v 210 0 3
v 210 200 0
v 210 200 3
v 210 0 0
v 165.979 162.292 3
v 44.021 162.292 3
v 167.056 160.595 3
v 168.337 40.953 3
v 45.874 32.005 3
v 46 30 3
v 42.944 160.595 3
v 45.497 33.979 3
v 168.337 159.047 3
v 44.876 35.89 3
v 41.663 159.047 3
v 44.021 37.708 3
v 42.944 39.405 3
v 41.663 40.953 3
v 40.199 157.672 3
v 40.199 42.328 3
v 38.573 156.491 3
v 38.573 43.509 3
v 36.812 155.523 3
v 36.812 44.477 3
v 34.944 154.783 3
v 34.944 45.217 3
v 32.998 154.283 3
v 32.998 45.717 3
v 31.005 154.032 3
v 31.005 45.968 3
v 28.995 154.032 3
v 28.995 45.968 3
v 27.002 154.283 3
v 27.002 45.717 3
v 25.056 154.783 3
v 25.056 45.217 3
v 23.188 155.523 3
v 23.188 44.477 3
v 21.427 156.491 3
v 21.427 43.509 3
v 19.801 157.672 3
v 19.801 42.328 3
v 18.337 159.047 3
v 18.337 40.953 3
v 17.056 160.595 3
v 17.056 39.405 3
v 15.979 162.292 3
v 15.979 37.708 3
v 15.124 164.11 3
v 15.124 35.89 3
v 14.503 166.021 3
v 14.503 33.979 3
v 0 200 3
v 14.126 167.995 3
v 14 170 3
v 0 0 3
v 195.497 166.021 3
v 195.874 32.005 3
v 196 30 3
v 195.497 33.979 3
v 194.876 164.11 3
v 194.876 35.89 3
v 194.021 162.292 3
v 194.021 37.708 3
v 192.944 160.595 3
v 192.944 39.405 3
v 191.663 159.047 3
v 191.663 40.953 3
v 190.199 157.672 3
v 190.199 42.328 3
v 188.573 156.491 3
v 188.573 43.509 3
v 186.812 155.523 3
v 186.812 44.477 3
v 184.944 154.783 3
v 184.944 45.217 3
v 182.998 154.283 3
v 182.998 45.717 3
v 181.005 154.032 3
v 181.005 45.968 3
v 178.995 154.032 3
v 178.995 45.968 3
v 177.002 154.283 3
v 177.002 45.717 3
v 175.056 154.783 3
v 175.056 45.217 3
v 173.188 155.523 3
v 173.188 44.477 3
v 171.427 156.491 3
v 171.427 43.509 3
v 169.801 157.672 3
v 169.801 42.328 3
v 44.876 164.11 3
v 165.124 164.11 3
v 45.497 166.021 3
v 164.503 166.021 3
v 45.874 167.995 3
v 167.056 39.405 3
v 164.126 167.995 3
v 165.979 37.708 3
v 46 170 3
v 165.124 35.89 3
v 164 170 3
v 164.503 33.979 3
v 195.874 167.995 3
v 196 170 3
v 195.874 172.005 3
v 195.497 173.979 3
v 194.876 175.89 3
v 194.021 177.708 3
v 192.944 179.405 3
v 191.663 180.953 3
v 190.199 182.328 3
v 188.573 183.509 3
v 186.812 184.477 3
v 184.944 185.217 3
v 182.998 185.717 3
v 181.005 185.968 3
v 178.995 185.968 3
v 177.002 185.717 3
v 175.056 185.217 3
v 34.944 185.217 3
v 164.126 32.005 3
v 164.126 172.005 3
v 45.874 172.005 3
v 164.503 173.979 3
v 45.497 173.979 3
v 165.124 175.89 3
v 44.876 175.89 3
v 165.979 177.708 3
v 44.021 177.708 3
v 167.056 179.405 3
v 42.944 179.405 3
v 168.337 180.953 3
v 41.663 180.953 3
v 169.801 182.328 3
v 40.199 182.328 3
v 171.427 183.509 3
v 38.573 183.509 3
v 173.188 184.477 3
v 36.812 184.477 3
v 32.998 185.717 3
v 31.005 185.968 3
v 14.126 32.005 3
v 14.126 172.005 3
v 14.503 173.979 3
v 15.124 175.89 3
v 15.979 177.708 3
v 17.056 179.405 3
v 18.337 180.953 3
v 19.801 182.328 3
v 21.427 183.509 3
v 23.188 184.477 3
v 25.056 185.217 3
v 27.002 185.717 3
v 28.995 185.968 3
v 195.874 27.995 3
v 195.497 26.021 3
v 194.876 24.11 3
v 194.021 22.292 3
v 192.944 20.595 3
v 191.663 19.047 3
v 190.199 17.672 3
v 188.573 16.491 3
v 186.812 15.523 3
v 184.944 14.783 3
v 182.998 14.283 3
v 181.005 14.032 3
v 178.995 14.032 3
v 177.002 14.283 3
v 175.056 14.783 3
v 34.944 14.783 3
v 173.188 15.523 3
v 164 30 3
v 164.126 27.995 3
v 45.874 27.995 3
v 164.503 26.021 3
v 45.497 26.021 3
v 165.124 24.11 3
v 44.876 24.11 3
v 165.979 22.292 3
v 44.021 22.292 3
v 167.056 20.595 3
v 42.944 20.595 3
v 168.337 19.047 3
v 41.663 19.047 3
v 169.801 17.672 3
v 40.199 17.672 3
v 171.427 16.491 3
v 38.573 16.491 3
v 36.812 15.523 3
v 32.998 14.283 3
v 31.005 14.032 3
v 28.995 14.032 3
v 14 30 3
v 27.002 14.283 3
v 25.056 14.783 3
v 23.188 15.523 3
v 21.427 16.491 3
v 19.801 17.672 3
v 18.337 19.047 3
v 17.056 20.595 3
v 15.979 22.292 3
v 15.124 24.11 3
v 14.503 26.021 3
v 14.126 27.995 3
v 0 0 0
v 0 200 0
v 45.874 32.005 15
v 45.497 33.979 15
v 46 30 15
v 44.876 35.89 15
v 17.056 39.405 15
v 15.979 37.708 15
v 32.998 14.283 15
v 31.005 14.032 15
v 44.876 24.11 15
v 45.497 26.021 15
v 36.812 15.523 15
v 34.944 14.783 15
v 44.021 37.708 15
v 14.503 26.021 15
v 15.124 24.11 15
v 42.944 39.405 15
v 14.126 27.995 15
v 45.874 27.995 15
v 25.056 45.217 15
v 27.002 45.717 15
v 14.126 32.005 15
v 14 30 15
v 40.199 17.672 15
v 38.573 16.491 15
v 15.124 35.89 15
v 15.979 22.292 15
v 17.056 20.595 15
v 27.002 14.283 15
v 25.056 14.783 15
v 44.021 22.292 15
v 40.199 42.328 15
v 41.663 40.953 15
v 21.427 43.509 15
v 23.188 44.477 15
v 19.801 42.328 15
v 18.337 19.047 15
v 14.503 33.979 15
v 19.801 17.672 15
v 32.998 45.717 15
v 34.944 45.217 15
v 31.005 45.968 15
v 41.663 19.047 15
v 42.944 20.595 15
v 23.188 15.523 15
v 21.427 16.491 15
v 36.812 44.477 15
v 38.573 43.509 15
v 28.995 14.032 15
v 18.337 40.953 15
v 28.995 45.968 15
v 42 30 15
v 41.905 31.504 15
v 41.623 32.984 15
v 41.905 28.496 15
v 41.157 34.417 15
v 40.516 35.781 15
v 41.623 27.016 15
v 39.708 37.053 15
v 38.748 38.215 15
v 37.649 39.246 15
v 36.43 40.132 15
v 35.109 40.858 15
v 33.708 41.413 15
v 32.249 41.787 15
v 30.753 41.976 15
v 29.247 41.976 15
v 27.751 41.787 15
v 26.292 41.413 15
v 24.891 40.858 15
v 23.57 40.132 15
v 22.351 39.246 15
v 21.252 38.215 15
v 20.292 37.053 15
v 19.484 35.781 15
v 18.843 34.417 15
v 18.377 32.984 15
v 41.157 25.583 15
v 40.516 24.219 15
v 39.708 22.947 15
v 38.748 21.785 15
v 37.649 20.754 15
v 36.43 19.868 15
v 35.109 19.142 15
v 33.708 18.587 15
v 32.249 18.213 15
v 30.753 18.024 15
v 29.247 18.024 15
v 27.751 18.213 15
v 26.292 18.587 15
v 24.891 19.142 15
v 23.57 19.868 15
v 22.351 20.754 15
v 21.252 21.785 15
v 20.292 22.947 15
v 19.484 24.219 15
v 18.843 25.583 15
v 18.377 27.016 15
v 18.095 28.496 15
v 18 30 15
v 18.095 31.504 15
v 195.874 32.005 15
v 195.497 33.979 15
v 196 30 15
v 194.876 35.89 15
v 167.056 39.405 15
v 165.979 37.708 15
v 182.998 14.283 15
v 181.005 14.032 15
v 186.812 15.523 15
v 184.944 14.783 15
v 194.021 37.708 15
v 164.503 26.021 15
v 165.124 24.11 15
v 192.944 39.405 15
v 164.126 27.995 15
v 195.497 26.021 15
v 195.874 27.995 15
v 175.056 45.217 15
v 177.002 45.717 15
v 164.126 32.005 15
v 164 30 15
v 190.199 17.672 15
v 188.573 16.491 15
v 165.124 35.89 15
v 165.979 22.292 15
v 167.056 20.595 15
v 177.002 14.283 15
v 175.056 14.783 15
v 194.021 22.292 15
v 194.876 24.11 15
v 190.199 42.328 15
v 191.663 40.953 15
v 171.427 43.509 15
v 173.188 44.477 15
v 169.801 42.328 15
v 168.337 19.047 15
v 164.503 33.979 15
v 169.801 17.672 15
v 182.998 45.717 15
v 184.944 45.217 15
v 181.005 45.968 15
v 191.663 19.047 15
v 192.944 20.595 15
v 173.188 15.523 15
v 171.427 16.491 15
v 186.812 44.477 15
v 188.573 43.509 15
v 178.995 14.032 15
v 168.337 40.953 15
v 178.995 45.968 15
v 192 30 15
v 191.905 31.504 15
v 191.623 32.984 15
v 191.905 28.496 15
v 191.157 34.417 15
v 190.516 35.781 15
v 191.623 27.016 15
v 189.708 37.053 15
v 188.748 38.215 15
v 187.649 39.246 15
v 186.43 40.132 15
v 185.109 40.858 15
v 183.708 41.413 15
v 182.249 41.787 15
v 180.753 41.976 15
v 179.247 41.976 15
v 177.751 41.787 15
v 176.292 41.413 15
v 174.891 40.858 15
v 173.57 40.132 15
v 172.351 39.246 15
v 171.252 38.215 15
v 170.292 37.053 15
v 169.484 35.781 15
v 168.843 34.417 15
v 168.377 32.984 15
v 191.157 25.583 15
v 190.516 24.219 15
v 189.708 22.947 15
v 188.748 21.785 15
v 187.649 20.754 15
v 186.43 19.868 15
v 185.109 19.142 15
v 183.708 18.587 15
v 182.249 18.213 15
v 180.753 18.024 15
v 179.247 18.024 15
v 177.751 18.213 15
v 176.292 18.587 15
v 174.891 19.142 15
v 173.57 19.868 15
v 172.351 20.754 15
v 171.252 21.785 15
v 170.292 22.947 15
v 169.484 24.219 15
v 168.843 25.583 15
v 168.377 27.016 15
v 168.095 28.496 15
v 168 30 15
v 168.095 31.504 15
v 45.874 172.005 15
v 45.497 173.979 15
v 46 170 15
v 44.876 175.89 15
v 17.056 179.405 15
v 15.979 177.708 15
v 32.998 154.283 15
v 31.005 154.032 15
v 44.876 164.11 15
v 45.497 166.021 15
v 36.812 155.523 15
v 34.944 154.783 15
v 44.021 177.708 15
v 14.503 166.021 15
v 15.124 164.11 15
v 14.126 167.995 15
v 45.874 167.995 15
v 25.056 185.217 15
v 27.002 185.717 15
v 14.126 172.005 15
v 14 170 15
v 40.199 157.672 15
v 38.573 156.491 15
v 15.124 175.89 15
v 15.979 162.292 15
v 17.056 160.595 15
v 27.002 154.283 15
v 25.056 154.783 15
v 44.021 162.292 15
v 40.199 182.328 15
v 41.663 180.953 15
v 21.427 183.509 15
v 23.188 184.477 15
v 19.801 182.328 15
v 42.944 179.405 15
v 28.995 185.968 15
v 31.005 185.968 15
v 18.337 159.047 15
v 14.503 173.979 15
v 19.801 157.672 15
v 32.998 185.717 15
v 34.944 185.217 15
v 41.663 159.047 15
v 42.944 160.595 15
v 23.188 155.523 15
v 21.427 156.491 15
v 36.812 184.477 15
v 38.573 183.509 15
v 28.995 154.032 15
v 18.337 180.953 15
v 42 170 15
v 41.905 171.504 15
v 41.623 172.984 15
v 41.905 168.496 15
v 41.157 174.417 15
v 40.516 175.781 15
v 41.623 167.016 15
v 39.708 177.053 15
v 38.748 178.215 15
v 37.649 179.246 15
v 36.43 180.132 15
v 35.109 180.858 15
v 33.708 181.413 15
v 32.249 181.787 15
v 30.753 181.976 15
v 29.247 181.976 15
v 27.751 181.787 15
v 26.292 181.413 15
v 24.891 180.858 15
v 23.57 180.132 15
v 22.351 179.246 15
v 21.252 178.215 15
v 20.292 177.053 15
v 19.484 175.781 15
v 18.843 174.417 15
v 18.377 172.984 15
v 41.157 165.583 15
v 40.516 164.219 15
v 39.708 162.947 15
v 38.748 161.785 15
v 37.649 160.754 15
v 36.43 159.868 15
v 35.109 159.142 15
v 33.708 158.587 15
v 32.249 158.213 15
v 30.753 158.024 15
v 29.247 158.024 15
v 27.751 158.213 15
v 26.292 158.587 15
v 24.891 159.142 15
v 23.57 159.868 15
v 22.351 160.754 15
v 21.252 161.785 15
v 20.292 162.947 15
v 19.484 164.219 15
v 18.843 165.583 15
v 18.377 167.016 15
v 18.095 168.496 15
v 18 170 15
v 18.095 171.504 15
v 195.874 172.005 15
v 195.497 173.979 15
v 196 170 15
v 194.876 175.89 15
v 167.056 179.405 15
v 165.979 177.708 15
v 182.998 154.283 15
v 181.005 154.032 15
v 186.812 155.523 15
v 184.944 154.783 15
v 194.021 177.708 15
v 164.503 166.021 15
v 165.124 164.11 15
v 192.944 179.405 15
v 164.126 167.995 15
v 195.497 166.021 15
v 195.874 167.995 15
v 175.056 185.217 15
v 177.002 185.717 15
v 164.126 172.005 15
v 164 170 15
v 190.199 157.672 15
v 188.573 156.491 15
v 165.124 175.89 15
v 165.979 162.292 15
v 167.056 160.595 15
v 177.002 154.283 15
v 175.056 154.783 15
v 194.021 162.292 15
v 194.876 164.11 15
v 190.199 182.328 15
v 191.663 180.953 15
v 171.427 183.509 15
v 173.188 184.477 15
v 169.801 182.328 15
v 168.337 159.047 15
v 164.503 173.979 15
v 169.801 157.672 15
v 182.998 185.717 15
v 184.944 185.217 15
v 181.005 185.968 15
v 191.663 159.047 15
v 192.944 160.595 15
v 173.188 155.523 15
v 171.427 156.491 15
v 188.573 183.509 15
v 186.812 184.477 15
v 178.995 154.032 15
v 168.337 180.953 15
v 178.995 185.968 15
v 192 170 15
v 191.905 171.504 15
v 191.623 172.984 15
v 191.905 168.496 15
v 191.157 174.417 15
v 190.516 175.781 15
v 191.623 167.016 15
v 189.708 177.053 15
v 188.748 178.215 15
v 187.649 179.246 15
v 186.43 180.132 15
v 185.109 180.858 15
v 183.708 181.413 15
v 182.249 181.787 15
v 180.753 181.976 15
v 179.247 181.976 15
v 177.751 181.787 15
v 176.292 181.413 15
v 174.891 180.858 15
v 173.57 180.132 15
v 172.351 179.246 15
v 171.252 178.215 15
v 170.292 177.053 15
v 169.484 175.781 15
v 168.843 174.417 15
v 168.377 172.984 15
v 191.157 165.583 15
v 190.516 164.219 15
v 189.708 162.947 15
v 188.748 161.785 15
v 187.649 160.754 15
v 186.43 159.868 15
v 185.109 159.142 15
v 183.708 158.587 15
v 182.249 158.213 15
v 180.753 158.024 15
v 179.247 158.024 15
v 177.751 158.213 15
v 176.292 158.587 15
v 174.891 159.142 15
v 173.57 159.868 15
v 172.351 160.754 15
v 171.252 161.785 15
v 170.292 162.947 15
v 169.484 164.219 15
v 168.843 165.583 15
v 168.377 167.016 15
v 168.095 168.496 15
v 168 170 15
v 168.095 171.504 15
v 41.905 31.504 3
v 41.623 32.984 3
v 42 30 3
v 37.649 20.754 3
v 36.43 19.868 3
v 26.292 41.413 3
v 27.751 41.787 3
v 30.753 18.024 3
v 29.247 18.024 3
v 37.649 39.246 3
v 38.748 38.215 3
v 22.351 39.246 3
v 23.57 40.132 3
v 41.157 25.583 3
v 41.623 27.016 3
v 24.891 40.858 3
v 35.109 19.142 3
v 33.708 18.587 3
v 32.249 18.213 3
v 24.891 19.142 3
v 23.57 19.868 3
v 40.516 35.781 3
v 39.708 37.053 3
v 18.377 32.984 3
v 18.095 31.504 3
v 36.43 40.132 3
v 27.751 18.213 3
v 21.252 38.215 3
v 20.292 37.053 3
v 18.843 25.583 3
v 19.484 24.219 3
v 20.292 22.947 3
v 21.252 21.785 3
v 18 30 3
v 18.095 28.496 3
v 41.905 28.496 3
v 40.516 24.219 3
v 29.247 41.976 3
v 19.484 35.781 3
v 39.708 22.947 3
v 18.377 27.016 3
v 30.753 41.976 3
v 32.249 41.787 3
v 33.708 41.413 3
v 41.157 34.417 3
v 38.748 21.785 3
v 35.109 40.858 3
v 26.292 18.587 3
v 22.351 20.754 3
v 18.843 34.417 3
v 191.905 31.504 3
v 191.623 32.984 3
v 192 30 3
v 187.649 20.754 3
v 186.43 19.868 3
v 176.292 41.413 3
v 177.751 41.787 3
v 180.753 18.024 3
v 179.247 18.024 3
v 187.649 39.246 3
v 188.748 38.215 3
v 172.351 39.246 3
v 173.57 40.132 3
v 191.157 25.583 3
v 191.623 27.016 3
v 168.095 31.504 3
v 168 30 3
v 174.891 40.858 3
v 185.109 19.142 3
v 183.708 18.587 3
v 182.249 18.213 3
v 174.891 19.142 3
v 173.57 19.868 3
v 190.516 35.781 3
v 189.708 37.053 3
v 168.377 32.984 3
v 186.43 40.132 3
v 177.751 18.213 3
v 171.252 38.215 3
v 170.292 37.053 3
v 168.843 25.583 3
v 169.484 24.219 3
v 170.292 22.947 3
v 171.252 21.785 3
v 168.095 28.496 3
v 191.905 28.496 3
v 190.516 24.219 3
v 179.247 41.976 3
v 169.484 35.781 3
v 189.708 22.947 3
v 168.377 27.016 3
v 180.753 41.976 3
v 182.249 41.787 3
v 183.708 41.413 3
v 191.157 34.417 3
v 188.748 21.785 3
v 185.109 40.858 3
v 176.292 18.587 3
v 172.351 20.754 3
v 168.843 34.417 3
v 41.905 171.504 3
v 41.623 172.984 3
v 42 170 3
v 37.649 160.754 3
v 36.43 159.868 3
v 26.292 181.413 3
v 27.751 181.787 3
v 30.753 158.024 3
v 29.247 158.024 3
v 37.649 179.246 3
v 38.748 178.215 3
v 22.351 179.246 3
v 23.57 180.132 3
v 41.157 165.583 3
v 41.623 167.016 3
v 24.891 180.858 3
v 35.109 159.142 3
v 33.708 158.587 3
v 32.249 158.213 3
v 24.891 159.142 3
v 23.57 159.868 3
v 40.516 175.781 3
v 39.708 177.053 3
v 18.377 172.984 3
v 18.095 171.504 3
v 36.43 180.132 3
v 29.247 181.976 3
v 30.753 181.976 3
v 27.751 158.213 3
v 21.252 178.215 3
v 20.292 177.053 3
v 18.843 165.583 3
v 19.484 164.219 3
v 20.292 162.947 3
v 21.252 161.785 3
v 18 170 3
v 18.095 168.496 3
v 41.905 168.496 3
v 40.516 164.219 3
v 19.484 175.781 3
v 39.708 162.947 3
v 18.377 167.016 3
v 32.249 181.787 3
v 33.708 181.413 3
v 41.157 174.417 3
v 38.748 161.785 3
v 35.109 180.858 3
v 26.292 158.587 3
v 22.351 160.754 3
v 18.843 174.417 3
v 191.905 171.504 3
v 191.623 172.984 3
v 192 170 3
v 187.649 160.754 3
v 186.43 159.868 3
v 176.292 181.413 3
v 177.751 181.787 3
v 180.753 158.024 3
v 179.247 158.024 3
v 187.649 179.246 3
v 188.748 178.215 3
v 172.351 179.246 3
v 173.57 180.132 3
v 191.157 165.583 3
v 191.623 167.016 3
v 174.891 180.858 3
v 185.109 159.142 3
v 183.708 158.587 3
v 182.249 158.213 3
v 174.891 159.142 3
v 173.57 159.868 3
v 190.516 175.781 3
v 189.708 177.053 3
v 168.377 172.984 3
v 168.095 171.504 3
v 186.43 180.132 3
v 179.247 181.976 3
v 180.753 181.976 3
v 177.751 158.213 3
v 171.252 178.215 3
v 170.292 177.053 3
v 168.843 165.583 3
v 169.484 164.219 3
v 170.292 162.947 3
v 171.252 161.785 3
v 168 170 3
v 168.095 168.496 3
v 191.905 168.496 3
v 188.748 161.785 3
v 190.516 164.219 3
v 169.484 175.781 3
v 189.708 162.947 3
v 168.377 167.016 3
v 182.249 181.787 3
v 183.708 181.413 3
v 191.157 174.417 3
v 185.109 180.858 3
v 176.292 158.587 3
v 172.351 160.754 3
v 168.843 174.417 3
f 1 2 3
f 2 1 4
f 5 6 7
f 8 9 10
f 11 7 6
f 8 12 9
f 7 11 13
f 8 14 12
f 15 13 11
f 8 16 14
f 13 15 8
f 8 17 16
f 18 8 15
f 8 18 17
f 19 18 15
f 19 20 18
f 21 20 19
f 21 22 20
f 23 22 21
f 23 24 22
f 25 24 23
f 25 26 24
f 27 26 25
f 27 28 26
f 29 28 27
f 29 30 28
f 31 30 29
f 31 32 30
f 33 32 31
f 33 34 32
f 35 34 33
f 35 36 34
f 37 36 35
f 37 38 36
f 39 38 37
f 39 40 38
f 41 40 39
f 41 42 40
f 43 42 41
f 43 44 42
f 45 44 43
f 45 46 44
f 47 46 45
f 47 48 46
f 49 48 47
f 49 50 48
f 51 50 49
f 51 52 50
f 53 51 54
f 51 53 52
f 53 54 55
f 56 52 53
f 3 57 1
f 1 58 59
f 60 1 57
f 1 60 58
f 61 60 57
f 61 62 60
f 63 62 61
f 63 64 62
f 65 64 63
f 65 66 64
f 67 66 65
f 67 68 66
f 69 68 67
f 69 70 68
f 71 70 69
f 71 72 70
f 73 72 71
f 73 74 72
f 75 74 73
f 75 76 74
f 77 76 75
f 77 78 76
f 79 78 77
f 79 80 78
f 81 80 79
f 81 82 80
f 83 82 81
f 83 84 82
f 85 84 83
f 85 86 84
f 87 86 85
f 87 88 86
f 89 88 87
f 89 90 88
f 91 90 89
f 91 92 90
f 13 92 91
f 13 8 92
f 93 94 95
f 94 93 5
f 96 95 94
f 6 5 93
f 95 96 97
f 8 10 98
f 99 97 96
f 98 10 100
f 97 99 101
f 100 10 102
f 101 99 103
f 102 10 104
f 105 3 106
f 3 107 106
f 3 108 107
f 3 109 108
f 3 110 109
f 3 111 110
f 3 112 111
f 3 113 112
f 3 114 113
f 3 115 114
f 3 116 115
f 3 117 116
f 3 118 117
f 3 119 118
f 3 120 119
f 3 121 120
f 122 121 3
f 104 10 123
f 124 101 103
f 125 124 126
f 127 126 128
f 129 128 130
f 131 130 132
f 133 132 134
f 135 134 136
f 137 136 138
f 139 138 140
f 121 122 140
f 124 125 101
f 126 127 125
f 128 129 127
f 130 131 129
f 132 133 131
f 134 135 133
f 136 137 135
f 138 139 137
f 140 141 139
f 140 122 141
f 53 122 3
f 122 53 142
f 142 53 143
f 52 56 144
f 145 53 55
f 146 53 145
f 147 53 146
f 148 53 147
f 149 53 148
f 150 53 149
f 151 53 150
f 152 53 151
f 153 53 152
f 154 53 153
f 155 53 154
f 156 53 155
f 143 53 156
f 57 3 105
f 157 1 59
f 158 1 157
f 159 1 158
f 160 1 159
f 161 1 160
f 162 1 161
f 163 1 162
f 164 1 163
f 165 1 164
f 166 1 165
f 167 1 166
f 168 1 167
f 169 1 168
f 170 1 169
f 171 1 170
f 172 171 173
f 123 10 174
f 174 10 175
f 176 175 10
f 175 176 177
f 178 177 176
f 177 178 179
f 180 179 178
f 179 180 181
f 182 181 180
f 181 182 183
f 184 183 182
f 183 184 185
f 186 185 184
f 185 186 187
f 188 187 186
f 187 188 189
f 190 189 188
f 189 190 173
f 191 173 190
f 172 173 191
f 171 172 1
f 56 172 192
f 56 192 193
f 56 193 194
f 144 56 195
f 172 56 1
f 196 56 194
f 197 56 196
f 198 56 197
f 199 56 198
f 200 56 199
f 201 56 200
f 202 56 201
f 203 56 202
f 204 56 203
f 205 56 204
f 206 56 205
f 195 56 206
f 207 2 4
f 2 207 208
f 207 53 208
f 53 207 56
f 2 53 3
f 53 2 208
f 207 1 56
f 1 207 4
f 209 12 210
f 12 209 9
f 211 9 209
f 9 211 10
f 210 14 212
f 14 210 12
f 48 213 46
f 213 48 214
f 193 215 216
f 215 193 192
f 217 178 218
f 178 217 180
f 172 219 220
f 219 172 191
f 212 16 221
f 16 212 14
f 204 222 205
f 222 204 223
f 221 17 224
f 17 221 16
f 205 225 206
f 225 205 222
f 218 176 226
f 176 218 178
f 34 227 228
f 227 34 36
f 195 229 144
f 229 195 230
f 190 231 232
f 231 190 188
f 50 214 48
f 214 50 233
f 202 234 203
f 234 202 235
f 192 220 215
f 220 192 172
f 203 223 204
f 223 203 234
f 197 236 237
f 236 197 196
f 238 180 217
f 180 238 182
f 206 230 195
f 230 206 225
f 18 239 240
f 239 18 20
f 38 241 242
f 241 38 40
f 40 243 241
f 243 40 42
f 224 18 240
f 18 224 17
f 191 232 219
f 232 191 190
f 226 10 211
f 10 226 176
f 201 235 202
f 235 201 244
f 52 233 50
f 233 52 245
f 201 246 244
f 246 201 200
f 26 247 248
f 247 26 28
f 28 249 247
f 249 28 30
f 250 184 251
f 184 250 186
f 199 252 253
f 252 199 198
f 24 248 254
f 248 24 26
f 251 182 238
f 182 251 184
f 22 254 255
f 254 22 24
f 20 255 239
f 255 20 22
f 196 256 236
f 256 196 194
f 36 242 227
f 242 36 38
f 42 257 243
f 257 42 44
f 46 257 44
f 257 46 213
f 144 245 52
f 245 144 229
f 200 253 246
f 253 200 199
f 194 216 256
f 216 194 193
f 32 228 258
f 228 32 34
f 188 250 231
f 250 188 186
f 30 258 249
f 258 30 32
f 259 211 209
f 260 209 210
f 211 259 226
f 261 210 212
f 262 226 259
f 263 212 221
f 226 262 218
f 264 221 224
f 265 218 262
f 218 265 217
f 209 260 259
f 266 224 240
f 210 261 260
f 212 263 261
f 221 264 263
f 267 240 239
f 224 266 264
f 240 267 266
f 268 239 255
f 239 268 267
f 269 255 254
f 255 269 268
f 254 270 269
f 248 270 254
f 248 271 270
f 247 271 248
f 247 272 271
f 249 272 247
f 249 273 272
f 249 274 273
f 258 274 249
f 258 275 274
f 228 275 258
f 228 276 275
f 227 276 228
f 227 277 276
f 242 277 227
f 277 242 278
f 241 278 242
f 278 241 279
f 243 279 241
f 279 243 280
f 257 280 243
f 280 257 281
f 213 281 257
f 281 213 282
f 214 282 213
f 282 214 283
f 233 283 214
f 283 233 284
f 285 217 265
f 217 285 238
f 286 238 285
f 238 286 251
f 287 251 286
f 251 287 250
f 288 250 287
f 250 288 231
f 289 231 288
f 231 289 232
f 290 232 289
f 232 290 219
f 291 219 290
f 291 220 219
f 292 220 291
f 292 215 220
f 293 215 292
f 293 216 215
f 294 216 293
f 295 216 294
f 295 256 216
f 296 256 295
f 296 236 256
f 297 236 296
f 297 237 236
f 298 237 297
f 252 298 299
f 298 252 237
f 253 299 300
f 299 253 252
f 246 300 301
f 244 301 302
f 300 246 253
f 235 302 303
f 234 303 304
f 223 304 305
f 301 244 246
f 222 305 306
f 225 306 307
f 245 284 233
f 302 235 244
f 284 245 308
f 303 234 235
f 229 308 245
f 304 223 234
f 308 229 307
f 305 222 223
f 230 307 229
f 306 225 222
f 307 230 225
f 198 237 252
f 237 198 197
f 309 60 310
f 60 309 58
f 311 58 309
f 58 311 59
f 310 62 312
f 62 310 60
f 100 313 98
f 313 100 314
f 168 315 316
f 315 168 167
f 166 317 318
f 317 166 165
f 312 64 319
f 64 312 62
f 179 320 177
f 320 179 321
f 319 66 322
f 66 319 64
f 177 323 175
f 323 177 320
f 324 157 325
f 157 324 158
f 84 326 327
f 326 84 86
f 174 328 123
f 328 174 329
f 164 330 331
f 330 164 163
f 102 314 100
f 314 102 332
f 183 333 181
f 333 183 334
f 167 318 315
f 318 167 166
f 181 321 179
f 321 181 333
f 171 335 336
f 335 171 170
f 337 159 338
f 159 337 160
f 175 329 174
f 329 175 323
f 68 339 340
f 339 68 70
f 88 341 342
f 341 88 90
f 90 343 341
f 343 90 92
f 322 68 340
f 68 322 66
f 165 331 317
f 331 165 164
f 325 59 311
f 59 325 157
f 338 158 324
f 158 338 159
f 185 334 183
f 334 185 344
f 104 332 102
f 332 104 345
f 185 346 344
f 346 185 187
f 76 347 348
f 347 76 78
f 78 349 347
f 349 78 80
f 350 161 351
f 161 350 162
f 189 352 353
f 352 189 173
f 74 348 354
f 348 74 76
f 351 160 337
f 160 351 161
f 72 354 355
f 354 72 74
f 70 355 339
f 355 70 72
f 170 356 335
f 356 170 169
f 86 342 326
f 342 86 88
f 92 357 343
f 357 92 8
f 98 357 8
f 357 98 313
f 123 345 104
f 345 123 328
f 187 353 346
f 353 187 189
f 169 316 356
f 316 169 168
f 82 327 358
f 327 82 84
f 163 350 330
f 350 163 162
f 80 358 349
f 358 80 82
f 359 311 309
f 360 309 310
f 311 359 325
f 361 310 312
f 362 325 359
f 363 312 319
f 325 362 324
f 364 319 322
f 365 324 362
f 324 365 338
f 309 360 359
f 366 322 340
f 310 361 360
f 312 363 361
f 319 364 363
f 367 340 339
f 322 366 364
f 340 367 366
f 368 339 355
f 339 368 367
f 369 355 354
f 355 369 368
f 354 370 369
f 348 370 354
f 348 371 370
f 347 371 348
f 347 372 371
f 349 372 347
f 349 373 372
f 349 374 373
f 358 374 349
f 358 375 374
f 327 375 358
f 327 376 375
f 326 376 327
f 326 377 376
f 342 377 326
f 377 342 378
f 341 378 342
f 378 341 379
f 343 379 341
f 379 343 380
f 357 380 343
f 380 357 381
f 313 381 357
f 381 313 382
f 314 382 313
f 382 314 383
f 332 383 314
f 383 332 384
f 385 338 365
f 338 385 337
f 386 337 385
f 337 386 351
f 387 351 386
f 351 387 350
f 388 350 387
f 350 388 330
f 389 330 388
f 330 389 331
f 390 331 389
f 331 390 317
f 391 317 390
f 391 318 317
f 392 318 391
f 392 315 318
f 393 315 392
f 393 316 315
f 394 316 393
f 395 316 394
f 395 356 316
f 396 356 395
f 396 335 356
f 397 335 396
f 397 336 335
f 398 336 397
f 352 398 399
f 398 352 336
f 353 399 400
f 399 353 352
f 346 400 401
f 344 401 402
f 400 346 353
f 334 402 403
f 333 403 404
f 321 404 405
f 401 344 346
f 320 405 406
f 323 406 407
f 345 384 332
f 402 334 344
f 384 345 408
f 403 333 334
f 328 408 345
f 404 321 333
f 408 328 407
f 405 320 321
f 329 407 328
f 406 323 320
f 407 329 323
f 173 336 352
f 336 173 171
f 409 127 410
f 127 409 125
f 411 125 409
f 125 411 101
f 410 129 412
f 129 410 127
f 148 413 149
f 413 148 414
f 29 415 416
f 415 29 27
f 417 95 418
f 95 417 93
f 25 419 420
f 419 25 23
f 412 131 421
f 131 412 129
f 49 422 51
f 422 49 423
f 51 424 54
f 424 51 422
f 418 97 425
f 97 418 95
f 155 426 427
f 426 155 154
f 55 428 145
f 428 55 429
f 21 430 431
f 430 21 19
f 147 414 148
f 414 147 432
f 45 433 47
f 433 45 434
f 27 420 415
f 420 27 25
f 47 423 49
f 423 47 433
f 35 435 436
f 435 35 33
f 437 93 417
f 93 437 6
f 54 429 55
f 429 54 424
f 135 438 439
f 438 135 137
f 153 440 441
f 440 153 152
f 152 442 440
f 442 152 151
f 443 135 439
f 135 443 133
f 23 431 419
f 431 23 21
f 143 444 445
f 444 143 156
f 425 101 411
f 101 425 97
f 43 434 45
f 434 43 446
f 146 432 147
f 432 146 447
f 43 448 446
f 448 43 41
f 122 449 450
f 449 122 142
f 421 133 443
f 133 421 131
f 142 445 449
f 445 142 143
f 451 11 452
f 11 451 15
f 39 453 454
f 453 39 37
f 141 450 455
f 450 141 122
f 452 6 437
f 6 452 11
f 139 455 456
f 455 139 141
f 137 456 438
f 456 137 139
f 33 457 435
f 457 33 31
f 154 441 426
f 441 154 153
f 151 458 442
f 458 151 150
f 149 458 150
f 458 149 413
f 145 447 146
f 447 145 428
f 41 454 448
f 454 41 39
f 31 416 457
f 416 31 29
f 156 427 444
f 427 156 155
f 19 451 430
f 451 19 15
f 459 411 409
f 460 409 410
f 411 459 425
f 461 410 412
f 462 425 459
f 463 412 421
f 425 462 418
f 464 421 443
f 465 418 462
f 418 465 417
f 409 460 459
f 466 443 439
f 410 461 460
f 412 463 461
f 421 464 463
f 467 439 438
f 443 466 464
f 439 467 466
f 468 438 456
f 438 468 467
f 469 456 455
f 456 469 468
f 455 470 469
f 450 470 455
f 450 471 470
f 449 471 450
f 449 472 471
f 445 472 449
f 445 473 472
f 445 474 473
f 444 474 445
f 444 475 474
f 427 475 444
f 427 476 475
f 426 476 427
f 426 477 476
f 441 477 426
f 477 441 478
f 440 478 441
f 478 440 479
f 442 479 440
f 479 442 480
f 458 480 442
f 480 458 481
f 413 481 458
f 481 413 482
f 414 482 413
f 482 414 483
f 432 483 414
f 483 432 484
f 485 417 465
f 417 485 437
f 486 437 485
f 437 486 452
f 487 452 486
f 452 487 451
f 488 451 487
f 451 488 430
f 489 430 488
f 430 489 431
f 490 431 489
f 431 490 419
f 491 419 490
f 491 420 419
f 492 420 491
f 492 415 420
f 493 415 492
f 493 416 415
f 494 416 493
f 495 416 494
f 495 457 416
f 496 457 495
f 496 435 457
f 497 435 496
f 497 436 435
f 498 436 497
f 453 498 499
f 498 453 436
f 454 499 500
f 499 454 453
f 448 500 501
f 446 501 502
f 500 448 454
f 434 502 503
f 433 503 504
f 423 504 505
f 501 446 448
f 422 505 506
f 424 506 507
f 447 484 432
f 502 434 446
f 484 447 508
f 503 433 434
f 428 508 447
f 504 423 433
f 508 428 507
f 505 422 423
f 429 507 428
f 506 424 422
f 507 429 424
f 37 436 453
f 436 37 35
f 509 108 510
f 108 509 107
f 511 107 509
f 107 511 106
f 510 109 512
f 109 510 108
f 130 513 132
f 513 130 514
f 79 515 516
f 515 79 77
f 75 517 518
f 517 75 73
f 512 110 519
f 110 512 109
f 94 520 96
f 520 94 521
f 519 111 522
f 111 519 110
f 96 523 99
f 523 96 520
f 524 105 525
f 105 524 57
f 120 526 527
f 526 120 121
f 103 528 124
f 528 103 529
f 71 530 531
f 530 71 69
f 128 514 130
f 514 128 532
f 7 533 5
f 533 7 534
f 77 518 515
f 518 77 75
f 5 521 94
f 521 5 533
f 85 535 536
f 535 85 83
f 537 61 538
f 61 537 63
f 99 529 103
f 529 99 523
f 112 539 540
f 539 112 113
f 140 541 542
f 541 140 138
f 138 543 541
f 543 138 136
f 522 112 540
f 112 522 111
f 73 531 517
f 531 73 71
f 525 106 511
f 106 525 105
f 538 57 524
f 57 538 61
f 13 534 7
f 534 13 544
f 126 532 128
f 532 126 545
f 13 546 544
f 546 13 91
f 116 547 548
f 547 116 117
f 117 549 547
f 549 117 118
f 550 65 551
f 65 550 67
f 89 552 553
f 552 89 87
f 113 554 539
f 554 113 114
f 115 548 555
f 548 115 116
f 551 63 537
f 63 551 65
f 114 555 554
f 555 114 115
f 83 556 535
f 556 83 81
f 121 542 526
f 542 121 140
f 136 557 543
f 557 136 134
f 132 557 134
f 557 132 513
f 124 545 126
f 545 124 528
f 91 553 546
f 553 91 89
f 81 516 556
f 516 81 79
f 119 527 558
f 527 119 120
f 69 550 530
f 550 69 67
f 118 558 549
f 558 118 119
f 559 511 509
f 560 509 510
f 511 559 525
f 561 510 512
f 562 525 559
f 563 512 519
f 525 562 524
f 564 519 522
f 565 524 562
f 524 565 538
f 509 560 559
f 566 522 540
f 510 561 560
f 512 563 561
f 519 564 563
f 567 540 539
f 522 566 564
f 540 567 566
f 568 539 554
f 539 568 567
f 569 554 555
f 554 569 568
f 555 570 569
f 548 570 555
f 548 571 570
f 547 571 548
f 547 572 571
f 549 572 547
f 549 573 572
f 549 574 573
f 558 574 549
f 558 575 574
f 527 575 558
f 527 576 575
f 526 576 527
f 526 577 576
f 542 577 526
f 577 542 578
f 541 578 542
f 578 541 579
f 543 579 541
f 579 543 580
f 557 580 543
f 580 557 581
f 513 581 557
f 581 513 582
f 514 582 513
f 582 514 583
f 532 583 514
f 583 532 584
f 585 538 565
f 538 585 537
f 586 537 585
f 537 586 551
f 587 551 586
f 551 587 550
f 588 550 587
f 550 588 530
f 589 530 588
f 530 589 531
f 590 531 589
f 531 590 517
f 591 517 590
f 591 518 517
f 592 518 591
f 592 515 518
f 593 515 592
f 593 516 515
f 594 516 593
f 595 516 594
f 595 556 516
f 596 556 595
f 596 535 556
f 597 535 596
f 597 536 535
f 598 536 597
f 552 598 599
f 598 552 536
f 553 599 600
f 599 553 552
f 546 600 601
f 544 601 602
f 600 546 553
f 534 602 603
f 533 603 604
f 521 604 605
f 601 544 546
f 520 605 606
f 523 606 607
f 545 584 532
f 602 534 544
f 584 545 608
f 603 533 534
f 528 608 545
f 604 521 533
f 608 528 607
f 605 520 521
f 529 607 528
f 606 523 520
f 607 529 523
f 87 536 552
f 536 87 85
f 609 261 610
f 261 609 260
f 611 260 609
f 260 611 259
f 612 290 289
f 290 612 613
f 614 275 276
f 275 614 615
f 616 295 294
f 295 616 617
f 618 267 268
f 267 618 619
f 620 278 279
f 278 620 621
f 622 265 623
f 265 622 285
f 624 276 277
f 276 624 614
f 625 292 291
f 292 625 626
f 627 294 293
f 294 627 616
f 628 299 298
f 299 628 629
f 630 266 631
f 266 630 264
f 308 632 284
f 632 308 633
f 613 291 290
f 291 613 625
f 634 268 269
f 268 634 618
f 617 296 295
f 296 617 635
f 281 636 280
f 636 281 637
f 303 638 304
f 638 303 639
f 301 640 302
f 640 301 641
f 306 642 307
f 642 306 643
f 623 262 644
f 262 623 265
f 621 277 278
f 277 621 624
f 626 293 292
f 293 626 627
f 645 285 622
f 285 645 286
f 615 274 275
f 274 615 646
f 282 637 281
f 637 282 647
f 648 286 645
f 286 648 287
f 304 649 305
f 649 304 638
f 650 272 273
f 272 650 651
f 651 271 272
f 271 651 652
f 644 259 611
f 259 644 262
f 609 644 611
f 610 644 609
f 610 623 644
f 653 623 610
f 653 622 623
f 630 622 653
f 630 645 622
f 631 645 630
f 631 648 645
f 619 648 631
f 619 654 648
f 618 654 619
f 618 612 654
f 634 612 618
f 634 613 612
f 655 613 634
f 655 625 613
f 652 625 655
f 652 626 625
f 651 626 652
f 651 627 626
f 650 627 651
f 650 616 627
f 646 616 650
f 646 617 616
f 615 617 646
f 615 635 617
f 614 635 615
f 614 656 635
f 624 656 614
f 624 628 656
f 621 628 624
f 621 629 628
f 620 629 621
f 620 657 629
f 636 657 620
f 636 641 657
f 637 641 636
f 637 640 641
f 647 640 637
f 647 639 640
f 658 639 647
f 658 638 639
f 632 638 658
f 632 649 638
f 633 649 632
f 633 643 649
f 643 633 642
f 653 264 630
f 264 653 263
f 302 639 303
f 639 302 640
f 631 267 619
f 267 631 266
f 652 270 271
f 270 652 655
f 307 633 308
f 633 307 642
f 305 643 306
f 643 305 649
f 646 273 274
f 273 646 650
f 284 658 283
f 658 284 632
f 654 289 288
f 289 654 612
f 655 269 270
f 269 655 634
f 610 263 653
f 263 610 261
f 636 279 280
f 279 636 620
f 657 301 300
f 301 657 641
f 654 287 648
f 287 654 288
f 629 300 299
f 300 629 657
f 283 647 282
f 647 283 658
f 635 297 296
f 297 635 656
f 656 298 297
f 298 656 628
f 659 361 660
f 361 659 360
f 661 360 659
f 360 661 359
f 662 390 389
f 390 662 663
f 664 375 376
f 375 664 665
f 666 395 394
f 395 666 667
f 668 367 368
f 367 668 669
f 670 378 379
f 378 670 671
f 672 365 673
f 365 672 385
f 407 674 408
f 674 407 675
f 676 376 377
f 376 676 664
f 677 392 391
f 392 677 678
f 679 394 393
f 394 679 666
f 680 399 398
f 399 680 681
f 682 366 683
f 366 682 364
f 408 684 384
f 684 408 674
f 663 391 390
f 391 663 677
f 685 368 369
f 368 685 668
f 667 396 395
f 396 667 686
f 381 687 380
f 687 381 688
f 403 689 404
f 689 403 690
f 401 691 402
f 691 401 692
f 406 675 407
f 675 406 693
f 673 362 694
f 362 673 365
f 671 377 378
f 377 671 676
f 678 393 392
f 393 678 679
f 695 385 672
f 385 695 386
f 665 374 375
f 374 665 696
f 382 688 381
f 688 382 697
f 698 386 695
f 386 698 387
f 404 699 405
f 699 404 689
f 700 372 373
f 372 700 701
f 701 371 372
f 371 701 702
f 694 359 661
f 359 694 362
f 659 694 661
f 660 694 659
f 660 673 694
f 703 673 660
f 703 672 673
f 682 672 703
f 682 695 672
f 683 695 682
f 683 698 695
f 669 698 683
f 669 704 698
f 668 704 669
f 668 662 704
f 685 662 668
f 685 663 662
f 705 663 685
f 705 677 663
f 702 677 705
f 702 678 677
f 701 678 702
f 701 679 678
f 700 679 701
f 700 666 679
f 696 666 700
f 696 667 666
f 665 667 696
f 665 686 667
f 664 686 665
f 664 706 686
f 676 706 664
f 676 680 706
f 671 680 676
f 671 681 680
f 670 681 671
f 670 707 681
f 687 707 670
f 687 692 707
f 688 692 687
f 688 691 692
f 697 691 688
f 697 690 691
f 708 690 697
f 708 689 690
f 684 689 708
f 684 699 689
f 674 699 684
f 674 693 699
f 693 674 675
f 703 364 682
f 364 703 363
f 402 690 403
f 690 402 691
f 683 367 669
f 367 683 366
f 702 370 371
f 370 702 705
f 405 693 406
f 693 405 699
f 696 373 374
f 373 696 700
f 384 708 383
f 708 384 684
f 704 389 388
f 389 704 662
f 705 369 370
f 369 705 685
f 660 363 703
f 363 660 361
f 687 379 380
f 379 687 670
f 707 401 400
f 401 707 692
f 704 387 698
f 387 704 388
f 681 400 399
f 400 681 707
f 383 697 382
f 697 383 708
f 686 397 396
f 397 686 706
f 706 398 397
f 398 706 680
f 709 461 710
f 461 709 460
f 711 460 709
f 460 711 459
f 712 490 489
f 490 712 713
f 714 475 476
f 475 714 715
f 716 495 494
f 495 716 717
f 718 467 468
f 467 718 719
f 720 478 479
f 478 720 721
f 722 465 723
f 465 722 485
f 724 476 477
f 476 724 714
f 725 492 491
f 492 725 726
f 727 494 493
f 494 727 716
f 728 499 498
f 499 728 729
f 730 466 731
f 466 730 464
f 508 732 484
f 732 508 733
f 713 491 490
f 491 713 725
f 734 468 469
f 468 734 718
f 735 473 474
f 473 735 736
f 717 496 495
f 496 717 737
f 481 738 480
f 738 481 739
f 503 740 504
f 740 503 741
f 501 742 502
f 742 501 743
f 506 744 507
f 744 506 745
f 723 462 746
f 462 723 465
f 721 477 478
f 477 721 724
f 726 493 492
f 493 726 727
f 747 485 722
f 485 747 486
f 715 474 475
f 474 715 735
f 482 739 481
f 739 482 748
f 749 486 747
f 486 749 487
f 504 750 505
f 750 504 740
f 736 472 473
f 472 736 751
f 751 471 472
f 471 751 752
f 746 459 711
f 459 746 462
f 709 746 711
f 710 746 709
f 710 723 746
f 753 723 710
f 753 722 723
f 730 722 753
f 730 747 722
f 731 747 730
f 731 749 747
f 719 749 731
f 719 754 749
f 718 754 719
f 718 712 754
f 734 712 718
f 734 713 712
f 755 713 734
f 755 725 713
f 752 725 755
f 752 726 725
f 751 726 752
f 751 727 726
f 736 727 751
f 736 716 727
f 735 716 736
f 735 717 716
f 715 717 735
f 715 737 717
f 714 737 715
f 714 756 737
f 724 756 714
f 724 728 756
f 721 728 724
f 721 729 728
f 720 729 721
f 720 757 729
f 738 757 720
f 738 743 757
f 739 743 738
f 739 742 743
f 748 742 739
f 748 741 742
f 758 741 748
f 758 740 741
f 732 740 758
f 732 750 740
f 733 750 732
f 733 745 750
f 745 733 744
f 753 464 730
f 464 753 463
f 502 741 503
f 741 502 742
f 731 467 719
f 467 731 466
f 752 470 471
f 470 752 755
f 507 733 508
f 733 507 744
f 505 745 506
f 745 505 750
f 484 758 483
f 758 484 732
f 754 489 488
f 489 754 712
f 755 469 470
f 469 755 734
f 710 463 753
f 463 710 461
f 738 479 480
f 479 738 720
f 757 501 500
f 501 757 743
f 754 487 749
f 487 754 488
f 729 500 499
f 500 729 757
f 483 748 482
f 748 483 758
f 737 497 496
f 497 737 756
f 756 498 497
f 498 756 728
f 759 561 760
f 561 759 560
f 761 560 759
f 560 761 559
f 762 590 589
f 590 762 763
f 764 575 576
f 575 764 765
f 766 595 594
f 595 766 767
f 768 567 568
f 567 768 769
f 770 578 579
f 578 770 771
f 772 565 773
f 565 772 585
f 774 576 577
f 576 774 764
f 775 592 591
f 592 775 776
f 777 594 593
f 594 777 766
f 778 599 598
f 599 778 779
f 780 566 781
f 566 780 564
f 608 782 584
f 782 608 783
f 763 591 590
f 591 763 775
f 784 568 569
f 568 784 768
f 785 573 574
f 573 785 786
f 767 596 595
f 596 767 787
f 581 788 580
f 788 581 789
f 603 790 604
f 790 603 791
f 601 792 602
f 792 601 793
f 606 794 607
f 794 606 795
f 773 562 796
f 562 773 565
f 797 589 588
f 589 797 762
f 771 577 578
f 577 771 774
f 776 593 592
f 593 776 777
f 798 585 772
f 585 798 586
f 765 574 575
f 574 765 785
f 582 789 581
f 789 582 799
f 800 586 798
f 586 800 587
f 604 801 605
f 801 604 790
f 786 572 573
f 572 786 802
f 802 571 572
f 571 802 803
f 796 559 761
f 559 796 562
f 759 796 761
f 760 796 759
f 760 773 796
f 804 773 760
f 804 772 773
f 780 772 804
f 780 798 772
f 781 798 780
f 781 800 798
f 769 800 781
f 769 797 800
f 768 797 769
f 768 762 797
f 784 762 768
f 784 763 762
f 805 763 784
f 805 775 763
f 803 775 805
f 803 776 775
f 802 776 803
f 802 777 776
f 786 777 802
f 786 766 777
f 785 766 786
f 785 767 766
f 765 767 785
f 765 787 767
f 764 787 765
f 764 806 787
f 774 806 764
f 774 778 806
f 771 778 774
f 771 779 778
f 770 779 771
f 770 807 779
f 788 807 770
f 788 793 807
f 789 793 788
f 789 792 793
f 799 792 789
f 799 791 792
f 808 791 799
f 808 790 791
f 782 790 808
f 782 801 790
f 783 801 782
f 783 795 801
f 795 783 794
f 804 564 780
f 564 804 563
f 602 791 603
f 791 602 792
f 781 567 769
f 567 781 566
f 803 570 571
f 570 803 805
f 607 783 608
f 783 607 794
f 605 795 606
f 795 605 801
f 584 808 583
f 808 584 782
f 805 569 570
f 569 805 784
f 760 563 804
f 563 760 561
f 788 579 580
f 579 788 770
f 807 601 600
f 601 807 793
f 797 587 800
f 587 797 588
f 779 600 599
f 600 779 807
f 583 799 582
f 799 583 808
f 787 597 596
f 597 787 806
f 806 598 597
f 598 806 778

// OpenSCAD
$fn=50;

width=210;  // [50:1:1000]
length=200; // [50:1:1000]
base_thickness=3;// [3:1:25]
support_radius=16;

difference() {

    // adds
    union() {
        translate([0,0,0]) cube([width,length,base_thickness]);
        translate([30,30,0]) cylinder(h=12+base_thickness,r=support_radius);
        translate([width-30,30,0]) cylinder(h=12+base_thickness,r=support_radius);
        translate([30,length-30,0]) cylinder(h=12+base_thickness,r=support_radius);
        translate([width-30,length-30,0]) cylinder(h=12+base_thickness,r=support_radius);
    }

    // subtracts
    union() {
        translate([30,30,3]) cylinder(h=12+base_thickness,r=support_radius-4);
        translate([width-30,30,3]) cylinder(h=12+base_thickness,r=support_radius-4);
        translate([30,length-30,3]) cylinder(h=12+base_thickness,r=support_radius-4);
        translate([width-30,length-30,3]) cylinder(h=12+base_thickness,r=support_radius-4);        
    }


}
